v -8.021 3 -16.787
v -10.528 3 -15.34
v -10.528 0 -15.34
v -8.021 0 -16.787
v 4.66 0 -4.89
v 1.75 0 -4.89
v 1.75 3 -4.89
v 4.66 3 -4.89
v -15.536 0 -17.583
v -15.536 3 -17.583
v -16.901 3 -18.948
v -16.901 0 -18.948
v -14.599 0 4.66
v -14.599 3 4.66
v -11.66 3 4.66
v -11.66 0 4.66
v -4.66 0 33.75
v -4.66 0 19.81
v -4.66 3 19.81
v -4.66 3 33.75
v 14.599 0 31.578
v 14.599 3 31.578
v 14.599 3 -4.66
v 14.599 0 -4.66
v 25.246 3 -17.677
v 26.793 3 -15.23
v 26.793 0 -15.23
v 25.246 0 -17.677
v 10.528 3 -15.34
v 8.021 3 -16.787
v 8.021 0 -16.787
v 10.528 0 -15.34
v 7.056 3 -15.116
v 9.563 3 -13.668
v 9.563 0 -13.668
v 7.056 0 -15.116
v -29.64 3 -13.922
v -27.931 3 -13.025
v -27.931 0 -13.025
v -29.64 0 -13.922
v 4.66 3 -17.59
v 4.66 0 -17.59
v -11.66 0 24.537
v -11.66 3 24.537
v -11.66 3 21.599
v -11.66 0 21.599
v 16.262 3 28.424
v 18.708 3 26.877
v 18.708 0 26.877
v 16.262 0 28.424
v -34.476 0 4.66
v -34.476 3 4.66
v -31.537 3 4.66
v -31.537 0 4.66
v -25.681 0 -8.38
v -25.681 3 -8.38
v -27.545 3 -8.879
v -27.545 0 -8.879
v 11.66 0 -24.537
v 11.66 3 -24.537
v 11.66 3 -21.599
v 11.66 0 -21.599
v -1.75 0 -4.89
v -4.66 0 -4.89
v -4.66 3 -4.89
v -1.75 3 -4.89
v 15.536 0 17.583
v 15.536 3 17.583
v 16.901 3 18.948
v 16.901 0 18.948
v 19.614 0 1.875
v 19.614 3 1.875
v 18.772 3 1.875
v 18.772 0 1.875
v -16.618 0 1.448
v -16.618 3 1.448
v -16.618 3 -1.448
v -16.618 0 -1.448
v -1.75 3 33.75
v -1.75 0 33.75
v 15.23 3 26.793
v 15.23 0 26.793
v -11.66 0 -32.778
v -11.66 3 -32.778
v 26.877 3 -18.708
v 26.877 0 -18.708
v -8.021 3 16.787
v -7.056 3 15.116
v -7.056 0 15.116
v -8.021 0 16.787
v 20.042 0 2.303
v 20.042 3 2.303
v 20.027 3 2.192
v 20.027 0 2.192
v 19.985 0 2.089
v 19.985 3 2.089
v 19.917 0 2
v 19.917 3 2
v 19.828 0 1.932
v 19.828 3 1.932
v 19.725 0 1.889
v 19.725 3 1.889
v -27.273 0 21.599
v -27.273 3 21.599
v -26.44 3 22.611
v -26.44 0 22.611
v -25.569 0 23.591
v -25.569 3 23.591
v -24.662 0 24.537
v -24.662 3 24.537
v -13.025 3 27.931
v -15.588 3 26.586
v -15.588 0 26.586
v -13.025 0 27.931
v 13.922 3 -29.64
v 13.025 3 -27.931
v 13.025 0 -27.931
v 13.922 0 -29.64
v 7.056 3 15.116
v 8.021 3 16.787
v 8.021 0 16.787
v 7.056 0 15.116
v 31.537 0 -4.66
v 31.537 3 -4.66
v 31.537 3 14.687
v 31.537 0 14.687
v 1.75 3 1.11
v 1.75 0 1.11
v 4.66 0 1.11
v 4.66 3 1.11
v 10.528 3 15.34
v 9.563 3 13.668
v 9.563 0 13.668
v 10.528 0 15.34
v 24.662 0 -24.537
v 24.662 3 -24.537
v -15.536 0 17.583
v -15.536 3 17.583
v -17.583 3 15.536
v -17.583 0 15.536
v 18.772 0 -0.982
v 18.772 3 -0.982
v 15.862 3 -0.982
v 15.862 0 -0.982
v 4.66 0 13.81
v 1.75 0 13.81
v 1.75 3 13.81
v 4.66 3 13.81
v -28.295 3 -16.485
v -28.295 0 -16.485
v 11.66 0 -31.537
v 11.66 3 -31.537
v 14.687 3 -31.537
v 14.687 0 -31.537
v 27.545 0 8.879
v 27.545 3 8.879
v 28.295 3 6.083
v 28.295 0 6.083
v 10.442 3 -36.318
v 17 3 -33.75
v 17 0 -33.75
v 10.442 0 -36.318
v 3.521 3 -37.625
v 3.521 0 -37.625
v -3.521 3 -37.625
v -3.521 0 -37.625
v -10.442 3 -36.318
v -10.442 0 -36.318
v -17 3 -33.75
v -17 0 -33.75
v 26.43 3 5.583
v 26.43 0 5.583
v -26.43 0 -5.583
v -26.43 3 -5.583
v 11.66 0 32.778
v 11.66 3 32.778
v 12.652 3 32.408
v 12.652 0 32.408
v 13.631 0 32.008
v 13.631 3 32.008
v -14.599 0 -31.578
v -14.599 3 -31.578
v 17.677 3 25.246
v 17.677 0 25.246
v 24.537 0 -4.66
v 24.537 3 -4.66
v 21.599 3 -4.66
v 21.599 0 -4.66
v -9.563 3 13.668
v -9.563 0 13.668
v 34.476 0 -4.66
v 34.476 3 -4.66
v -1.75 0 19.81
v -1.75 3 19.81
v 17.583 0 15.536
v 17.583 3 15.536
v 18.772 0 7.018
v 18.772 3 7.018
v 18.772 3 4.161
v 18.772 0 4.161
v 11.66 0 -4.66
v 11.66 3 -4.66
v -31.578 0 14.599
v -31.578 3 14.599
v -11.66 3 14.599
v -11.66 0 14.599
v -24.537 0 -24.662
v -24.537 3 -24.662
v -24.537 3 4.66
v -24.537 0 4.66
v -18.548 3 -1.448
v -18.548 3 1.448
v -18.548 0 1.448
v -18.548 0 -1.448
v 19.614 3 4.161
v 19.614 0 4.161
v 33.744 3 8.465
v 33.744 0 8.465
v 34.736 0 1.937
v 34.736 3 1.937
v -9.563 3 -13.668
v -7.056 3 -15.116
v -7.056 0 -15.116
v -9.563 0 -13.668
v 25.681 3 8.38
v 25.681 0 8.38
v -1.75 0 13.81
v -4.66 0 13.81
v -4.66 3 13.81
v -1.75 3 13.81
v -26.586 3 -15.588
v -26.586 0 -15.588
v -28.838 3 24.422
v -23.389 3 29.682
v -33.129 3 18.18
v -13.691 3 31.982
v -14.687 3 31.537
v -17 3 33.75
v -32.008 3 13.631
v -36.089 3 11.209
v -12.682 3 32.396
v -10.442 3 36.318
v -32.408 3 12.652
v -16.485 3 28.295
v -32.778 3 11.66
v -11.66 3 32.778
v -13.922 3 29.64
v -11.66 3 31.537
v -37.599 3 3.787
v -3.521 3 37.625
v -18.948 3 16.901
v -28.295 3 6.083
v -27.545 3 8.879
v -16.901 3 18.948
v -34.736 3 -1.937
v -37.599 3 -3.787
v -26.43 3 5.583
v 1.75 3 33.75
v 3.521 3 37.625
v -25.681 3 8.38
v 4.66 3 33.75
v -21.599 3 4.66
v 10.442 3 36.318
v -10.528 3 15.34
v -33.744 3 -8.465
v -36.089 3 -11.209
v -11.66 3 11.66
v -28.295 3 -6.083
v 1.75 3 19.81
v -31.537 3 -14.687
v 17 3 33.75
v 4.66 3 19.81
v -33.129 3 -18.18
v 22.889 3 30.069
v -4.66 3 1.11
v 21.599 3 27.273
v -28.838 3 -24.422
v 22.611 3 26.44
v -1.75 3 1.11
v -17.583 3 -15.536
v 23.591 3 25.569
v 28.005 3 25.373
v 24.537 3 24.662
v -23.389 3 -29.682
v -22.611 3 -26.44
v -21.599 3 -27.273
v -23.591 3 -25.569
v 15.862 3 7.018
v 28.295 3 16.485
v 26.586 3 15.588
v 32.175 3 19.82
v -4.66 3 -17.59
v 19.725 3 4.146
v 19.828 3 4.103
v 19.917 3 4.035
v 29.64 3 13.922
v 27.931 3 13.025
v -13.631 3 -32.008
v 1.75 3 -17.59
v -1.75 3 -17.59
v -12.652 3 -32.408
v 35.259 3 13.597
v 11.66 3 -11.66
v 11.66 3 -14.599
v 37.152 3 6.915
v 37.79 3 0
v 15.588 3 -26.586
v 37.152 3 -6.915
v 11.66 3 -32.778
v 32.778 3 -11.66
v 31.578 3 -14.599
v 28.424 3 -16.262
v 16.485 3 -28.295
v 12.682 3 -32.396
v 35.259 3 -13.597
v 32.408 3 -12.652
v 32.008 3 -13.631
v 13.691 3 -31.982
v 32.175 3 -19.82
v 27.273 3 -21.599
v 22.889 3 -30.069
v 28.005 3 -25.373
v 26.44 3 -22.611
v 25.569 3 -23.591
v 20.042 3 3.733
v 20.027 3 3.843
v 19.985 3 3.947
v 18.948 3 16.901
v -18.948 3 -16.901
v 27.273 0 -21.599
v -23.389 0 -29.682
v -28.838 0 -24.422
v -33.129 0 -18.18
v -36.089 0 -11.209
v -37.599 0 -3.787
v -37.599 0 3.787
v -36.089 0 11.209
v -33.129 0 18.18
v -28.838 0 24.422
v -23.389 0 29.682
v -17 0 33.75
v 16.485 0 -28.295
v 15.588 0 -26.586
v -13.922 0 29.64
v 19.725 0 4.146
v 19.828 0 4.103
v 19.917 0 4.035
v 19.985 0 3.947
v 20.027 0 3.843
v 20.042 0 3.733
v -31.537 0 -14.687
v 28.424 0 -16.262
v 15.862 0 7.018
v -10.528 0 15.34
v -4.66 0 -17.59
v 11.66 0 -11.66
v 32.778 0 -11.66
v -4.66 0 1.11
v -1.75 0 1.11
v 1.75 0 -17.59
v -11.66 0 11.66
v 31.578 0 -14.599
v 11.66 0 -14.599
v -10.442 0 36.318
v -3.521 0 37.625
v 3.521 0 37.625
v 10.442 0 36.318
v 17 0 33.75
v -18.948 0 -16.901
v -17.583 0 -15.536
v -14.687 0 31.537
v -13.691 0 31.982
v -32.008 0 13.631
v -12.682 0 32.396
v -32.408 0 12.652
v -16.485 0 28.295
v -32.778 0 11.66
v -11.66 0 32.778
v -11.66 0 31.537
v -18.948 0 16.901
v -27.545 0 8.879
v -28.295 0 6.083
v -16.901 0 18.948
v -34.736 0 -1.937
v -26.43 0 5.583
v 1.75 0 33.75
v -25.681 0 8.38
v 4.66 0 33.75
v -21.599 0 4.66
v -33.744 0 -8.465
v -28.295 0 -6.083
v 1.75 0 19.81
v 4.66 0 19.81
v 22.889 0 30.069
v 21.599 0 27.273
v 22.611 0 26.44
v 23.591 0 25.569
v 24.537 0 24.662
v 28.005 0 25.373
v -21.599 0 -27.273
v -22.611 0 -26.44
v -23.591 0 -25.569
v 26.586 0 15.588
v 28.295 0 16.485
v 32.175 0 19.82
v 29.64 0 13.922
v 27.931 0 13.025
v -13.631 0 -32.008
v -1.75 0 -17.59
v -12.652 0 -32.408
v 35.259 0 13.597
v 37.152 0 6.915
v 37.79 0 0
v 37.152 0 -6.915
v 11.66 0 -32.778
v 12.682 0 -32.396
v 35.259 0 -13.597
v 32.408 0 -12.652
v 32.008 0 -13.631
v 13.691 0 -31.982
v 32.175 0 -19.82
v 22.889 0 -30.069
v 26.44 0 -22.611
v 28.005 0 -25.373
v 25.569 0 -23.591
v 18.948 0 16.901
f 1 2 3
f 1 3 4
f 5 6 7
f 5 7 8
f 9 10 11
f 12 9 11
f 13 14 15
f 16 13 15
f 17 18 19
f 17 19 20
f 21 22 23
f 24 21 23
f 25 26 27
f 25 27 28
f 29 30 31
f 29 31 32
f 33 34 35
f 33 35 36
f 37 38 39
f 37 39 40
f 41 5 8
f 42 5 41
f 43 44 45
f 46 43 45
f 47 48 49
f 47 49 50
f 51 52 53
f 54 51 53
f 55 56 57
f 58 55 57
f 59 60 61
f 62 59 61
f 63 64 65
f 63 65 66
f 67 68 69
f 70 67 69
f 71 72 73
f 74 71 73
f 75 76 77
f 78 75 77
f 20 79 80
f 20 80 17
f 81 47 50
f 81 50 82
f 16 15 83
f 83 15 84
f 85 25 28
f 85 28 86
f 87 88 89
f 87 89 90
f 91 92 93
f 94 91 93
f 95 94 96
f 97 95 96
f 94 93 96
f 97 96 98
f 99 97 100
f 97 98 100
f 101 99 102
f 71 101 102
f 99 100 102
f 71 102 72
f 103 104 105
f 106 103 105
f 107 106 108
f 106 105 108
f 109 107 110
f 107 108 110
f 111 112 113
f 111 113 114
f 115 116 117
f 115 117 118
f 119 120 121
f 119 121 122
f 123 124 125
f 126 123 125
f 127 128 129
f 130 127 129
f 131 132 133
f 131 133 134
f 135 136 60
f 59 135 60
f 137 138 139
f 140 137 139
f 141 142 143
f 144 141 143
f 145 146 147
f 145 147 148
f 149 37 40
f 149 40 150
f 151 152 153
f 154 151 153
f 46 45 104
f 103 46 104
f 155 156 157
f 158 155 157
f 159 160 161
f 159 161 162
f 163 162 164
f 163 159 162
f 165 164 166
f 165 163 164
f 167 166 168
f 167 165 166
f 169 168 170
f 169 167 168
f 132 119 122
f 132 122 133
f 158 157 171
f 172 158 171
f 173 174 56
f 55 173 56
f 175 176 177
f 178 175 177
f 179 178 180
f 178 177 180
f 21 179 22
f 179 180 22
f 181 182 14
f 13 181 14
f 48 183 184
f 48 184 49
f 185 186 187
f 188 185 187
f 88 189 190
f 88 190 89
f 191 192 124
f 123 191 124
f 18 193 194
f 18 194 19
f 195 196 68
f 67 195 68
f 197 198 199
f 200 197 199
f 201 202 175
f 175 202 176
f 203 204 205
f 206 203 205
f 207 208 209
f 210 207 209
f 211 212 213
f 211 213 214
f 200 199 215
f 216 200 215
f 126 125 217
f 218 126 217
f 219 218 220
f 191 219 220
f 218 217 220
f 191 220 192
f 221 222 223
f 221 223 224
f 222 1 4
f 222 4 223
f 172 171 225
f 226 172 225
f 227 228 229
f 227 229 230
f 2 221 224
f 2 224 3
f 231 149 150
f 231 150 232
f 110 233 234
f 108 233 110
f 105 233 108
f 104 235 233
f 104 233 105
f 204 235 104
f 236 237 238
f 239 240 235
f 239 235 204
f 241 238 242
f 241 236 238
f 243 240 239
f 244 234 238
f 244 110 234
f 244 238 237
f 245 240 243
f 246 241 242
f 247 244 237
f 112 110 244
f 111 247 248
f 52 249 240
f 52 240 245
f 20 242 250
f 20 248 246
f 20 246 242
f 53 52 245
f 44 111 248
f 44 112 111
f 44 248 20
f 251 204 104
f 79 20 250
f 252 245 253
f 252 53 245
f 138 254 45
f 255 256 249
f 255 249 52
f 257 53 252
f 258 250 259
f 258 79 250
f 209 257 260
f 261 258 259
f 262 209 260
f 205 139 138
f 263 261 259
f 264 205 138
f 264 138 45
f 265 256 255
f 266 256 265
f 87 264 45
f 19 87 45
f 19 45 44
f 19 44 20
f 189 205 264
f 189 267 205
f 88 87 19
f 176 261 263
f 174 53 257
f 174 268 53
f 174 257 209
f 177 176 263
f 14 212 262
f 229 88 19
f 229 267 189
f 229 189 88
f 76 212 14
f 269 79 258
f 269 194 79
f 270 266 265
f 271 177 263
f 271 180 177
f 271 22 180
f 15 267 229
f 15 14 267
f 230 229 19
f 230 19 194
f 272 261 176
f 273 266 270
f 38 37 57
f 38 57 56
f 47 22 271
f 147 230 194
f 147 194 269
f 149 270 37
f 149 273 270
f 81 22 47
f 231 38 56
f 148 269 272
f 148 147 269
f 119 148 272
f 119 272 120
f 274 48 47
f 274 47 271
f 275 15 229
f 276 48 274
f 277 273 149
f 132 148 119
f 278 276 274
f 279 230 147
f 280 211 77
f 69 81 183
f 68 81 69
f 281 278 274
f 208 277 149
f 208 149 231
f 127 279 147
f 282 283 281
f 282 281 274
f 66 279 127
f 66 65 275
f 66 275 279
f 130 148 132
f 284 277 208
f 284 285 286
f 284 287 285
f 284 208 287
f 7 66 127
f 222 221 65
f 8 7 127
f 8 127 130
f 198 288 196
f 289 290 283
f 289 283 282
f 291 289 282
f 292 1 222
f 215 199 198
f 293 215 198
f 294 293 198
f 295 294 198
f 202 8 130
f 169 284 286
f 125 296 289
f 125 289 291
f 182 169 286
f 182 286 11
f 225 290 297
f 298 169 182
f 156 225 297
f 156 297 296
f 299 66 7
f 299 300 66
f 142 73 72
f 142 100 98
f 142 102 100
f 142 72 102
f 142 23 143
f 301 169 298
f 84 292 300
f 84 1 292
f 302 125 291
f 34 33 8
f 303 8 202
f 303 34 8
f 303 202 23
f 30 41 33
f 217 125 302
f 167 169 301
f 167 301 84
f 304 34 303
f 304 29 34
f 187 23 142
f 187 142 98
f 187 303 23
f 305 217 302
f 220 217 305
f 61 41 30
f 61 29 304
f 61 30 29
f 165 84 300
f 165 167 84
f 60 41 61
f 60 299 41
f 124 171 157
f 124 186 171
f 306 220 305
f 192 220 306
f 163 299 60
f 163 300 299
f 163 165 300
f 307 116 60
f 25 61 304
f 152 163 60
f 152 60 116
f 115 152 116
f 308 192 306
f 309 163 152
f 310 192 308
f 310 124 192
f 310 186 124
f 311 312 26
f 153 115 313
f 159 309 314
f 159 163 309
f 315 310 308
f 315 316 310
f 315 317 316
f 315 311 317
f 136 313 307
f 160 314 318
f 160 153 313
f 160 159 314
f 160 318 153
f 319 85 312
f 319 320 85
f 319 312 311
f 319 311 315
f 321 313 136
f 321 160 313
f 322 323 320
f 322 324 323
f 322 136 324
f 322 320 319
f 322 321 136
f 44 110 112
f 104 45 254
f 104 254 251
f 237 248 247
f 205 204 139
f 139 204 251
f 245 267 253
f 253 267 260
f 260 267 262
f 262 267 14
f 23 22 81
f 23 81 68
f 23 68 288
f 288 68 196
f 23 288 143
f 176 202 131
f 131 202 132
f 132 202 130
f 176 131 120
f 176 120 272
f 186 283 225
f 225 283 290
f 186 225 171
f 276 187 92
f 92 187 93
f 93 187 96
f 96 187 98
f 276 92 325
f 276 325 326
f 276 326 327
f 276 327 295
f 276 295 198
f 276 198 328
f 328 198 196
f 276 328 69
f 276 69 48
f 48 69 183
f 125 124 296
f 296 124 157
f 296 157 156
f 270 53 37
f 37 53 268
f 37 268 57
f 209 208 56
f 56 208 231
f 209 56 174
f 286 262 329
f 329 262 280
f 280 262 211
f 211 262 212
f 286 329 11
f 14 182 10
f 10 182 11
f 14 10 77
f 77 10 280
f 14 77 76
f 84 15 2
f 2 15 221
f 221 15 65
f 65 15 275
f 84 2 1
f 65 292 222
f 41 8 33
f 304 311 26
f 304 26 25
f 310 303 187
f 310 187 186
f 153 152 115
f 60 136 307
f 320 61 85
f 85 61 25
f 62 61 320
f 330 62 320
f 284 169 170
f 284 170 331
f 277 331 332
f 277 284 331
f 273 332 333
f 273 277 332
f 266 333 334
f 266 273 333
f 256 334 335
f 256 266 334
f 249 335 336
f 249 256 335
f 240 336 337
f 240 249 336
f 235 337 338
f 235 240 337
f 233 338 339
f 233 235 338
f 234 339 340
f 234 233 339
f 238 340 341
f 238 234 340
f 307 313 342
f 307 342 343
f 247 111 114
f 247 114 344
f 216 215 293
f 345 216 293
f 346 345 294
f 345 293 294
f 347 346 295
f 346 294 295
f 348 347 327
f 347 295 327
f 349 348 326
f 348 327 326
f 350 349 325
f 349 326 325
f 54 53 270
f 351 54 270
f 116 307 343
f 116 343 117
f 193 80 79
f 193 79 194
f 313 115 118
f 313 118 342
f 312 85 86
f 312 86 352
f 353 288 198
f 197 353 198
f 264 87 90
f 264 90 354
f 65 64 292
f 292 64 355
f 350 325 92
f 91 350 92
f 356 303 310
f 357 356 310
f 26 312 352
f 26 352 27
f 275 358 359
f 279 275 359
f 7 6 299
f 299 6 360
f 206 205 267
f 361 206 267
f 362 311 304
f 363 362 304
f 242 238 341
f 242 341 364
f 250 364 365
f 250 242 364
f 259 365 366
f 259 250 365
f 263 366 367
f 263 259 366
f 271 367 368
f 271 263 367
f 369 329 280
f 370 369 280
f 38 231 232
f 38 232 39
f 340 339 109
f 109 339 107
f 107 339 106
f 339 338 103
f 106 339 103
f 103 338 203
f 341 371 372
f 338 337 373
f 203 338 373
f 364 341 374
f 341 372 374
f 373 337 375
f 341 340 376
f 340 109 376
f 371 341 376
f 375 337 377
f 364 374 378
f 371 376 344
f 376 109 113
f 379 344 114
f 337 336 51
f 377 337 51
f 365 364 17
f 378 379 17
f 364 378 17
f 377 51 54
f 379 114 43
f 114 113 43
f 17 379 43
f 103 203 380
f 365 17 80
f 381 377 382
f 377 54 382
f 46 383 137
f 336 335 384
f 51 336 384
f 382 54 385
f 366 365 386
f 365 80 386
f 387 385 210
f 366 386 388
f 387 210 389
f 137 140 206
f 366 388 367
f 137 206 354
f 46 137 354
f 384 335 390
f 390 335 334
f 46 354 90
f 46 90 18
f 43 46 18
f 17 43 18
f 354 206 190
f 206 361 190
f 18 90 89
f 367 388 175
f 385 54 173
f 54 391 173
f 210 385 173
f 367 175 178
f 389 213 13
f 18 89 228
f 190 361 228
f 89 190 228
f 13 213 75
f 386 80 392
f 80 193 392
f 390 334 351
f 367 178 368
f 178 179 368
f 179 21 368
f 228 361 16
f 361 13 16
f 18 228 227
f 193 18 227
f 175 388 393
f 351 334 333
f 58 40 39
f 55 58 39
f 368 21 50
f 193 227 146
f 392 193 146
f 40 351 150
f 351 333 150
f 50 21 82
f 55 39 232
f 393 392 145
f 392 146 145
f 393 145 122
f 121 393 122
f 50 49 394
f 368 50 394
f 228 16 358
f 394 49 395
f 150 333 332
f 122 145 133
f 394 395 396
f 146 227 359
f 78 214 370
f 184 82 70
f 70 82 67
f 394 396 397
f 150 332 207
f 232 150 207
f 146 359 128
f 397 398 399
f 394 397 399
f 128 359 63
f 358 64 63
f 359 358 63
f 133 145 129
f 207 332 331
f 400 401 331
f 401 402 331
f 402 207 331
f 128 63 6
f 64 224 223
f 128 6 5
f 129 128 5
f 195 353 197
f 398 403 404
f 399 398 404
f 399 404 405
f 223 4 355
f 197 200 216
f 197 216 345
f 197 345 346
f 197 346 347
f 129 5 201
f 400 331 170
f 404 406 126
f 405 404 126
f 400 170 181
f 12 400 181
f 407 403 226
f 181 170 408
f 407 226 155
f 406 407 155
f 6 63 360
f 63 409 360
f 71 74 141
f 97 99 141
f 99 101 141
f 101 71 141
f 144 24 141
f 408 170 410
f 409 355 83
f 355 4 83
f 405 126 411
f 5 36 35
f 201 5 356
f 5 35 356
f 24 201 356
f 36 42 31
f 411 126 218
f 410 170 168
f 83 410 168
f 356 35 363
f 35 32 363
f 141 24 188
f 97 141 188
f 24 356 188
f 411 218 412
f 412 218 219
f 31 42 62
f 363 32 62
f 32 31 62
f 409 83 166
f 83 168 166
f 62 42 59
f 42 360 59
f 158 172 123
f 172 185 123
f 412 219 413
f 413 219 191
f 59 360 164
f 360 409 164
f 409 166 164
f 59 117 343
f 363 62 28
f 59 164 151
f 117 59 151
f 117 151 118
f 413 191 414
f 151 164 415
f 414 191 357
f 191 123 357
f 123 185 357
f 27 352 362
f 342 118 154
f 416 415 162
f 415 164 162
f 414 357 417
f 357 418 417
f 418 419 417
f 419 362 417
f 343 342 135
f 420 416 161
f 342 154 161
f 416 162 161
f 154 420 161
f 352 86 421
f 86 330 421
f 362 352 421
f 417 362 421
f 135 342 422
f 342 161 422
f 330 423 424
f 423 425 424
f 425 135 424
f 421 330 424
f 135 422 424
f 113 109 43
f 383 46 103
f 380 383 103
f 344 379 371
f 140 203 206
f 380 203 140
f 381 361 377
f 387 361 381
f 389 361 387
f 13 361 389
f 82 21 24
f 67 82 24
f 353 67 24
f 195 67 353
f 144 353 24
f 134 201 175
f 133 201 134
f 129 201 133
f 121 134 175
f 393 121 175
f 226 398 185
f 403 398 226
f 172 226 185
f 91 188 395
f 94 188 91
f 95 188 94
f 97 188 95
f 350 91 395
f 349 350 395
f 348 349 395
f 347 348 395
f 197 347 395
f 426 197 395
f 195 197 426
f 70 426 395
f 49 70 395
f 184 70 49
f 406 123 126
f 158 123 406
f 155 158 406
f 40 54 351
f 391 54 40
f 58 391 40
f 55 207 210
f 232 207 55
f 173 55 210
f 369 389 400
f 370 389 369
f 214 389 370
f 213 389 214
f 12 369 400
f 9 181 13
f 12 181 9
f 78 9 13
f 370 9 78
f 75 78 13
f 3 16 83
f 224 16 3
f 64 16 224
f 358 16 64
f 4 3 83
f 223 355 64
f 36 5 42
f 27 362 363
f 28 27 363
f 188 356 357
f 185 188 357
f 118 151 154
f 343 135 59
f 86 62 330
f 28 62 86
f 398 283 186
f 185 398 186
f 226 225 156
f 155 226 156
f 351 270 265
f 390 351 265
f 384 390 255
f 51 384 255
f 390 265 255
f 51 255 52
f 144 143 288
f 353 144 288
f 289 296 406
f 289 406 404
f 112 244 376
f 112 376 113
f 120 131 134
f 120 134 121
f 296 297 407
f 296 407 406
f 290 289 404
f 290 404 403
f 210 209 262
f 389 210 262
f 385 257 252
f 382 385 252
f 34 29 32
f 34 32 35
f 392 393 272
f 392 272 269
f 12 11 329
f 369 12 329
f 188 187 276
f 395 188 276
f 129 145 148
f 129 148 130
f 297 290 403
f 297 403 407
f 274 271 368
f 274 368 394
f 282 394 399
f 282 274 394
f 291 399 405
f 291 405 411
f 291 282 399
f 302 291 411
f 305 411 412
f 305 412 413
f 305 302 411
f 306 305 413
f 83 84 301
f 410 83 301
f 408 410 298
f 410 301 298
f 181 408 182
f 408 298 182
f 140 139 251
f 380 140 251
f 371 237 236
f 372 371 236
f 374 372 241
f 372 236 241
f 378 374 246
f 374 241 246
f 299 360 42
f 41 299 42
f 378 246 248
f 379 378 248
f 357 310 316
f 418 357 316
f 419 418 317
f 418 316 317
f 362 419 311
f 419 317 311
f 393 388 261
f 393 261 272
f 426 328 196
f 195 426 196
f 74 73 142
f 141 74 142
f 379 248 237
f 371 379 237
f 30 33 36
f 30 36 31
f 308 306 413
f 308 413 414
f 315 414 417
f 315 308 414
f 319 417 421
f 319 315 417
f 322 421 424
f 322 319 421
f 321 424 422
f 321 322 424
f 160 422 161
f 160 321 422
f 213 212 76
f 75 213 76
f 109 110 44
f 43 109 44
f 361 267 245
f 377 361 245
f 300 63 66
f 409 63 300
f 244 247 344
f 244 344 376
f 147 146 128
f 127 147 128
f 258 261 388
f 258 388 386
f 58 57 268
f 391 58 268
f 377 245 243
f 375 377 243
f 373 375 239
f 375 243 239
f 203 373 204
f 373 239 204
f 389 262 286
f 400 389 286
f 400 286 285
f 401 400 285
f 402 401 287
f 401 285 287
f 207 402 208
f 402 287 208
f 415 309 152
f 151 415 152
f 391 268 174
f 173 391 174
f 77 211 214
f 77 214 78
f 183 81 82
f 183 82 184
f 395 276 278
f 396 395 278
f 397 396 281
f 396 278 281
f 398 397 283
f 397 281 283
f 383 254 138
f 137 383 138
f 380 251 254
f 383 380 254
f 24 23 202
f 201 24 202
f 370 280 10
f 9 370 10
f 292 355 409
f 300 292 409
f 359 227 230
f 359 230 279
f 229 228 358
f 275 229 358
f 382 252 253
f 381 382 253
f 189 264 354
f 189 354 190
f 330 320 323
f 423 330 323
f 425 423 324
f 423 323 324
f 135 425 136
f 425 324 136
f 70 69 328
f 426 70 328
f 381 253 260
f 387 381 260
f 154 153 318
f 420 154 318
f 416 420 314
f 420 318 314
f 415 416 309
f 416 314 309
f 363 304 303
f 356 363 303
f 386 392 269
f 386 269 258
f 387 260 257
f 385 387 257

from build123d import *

# Parameters (mm, degrees)
SKETCH_1_W          = 2.91
SKETCH_1_H          = 12.7
EXTRUDE_1_DEPTH     = 3
EXTRUDE_2_DEPTH     = 3
CUT_EXTRUDE_3_DEPTH = 3
SKETCH_3_W          = 1.93
SKETCH_3_H          = 2.895
CUT_EXTRUDE_1_DEPTH = 3


with BuildPart() as part:
    # 스케치1 → 보스-돌출1 (new body)
    with BuildSketch(Plane(origin=(0, 0, 0), x_dir=(1, 0, 0), z_dir=(0, 1, 0))):
        Polygon((-17, -33.75), (-17, 33.75), (-4.66, 33.75), (-1.75, 33.75), (1.75, 33.75), (4.66, 33.75), (17, 33.75), (17, -33.75), (4.66, -33.75), (4.66, -19.81), (1.75, -19.81), (1.75, -33.75), (-1.75, -33.75), (-1.75, -19.81), (-4.66, -19.81), (-4.66, -33.75), align=None)
        with Locations((-3.205, 11.24)):
            Rectangle(SKETCH_1_W, SKETCH_1_H, mode=Mode.SUBTRACT)
        with Locations((-3.205, -7.46)):
            Rectangle(SKETCH_1_W, SKETCH_1_H, mode=Mode.SUBTRACT)
        with Locations((3.205, 11.24)):
            Rectangle(SKETCH_1_W, SKETCH_1_H, mode=Mode.SUBTRACT)
        with Locations((3.205, -7.46)):
            Rectangle(SKETCH_1_W, SKETCH_1_H, mode=Mode.SUBTRACT)
    extrude(amount=EXTRUDE_1_DEPTH)

    # 스케치2 → 보스-돌출2 (add)
    with BuildSketch(Plane(origin=(0, 3, 0), x_dir=(1, 0, 0), z_dir=(0, 1, 0))):
        with BuildLine():
            Line((-17, -33.75), (-17, 33.75))
            ThreePointArc((-17, 33.75), (-37.789714209, 0), (-17, -33.75))
        make_face()
        with BuildLine():
            ThreePointArc((-17, -33.75), (0, -37.789714209), (17, -33.75))
            Line((17, -33.75), (4.66, -33.75))
            Line((4.66, -33.75), (1.75, -33.75))
            Line((1.75, -33.75), (-1.75, -33.75))
            Line((-1.75, -33.75), (-4.66, -33.75))
            Line((-4.66, -33.75), (-17, -33.75))
        make_face()
        with BuildLine():
            ThreePointArc((37.789714209, 0), (32.175205062, 19.819653862), (17, 33.75))
            Line((17, 33.75), (17, -33.75))
            ThreePointArc((17, -33.75), (32.175205062, -19.819653862), (37.789714209, 0))
        make_face()
        with BuildLine():
            Line((-17, 33.75), (17, 33.75))
            ThreePointArc((17, 33.75), (0, 37.789714209), (-17, 33.75))
        make_face()
    extrude(amount=-EXTRUDE_2_DEPTH)

    # 스케치5 → 컷-돌출3 (cut)
    with BuildSketch(Plane(origin=(0, 3, 0), x_dir=(1, 0, 0), z_dir=(0, 1, 0))):
        with BuildLine():
            Line((-34.476203601, -4.66), (-31.537469067, -4.66))
            Line((-31.537469067, -4.66), (-31.537469067, 14.687146066))
            ThreePointArc((-31.537469067, 14.687146066), (-34.395192397, 5.224457362), (-34.476203601, -4.66))
        make_face()
        with BuildLine():
            Line((-24.537469067, 24.662457836), (-24.537469067, -4.66))
            Line((-24.537469067, -4.66), (-21.598734534, -4.66))
            Line((-21.598734534, -4.66), (-21.598734534, 27.273043125))
            ThreePointArc((-21.598734534, 27.273043125), (-23.10500183, 26.009288825), (-24.537469067, 24.662457836))
        make_face()
        with BuildLine():
            Line((-14.598734534, 31.578492123), (-14.598734534, -4.66))
            Line((-14.598734534, -4.66), (-11.66, -4.66))
            Line((-11.66, -4.66), (-11.66, 32.777562672))
            ThreePointArc((-11.66, 32.777562672), (-13.143048633, 32.211558288), (-14.598734534, 31.578492123))
        make_face()
        with BuildLine():
            Line((31.578492123, 14.598734534), (11.66, 14.598734534))
            Line((11.66, 14.598734534), (11.66, 11.66))
            Line((11.66, 11.66), (32.777562672, 11.66))
            ThreePointArc((32.777562672, 11.66), (32.211558288, 13.143048633), (31.578492123, 14.598734534))
        make_face()
        with BuildLine():
            Line((24.662457836, 24.537469067), (11.66, 24.537469067))
            Line((11.66, 24.537469067), (11.66, 21.598734534))
            Line((11.66, 21.598734534), (27.273043125, 21.598734534))
            ThreePointArc((27.273043125, 21.598734534), (26.009288825, 23.10500183), (24.662457836, 24.537469067))
        make_face()
        with BuildLine():
            Line((11.66, 31.537469067), (14.687146066, 31.537469067))
            ThreePointArc((14.687146066, 31.537469067), (13.188156979, 32.193116194), (11.66, 32.777562672))
            Line((11.66, 32.777562672), (11.66, 31.537469067))
        make_face()
        with BuildLine():
            Line((14.598734534, -31.578492123), (14.598734534, 4.66))
            Line((14.598734534, 4.66), (11.66, 4.66))
            Line((11.66, 4.66), (11.66, -32.777562672))
            ThreePointArc((11.66, -32.777562672), (13.143048633, -32.211558288), (14.598734534, -31.578492123))
        make_face()
        with BuildLine():
            Line((24.537469067, -24.662457836), (24.537469067, 4.66))
            Line((24.537469067, 4.66), (21.598734534, 4.66))
            Line((21.598734534, 4.66), (21.598734534, -27.273043125))
            ThreePointArc((21.598734534, -27.273043125), (23.10500183, -26.009288825), (24.537469067, -24.662457836))
        make_face()
        with BuildLine():
            Line((31.537469067, 4.66), (31.537469067, -14.687146066))
            ThreePointArc((31.537469067, -14.687146066), (34.395192397, -5.224457362), (34.476203601, 4.66))
            Line((34.476203601, 4.66), (31.537469067, 4.66))
        make_face()
        with BuildLine():
            Line((-31.578492123, -14.598734534), (-11.66, -14.598734534))
            Line((-11.66, -14.598734534), (-11.66, -11.66))
            Line((-11.66, -11.66), (-32.777562672, -11.66))
            ThreePointArc((-32.777562672, -11.66), (-32.211558288, -13.143048633), (-31.578492123, -14.598734534))
        make_face()
        with BuildLine():
            Line((-24.662457836, -24.537469067), (-11.66, -24.537469067))
            Line((-11.66, -24.537469067), (-11.66, -21.598734534))
            Line((-11.66, -21.598734534), (-27.273043125, -21.598734534))
            ThreePointArc((-27.273043125, -21.598734534), (-26.009288825, -23.10500183), (-24.662457836, -24.537469067))
        make_face()
        with BuildLine():
            Line((-11.66, -31.537469067), (-14.687146066, -31.537469067))
            ThreePointArc((-14.687146066, -31.537469067), (-13.188156979, -32.193116194), (-11.66, -32.777562672))
            Line((-11.66, -32.777562672), (-11.66, -31.537469067))
        make_face()
    extrude(amount=-CUT_EXTRUDE_3_DEPTH, mode=Mode.SUBTRACT)

    # 스케치3 → 컷-돌출1 (cut)
    with BuildSketch(Plane(origin=(0, 3, 0), x_dir=(1, 0, 0), z_dir=(0, 1, 0))):
        Polygon((-13.921720976, -29.640380671), (-16.485116171, -28.295007088), (-15.588200449, -26.586076958), (-13.024805254, -27.931450541), align=None)
        Polygon((-29.640380671, 13.921720976), (-28.295007088, 16.485116171), (-26.586076958, 15.588200449), (-27.931450541, 13.024805254), align=None)
        Polygon((13.921720976, 29.640380671), (16.485116171, 28.295007088), (15.588200449, 26.586076958), (13.024805254, 27.931450541), align=None)
        Polygon((26.876754365, 18.708462151), (28.424032932, 16.261636853), (26.792816067, 15.230117809), (25.2455375, 17.676943106), align=None)
        Polygon((29.640380671, -13.921720976), (28.295007088, -16.485116171), (26.586076958, -15.588200449), (27.931450541, -13.024805254), align=None)
        Polygon((-28.294726577, -6.082986865), (-27.545445441, -8.879342132), (-25.681208596, -8.379821375), (-26.430489732, -5.583466108), align=None)
        Polygon((-27.545445441, 8.879342132), (-28.294726577, 6.082986865), (-26.430489732, 5.583466108), (-25.681208596, 8.379821375), align=None)
        Polygon((27.545445441, -8.879342132), (28.294726577, -6.082986865), (26.430489732, -5.583466108), (25.681208596, -8.379821375), align=None)
        Polygon((-18.947986862, -16.900912731), (-16.900912731, -18.947986862), (-15.536196643, -17.583270774), (-17.583270774, -15.536196643), align=None)
        Polygon((-16.900912731, 18.947986862), (-18.947986862, 16.900912731), (-17.583270774, 15.536196643), (-15.536196643, 17.583270774), align=None)
        with BuildLine():
            Line((15.862041837, -7.0175654), (18.772041837, -7.0175654))
            Line((18.772041837, -7.0175654), (18.772041837, -4.1605654))
            Line((18.772041837, -4.1605654), (19.614041677, -4.1605654))
            ThreePointArc((19.614041677, -4.1605654), (19.916683492, -4.035207055), (20.042041837, -3.73256524))
            Line((20.042041837, -3.73256524), (20.042041837, -2.30256556))
            ThreePointArc((20.042041837, -2.30256556), (19.916683492, -1.999923745), (19.614041677, -1.8745654))
            Line((19.614041677, -1.8745654), (18.772041837, -1.8745654))
            Line((18.772041837, -1.8745654), (18.772041837, 0.9824346))
            Line((18.772041837, 0.9824346), (15.862041837, 0.9824346))
            Line((15.862041837, 0.9824346), (15.862041837, -7.0175654))
        make_face()
        Polygon((18.708462151, -26.876754365), (16.261636853, -28.424032932), (15.230117809, -26.792816067), (17.676943106, -25.2455375), align=None)
        Polygon((16.900912731, -18.947986862), (18.947986862, -16.900912731), (17.583270774, -15.536196643), (15.536196643, -17.583270774), align=None)
        Polygon((-10.527707159, 15.339523687), (-8.020563615, 16.787023687), (-7.055563615, 15.115594658), (-9.562707159, 13.668094658), align=None)
        with Locations((-17.583270774, 0)):
            Rectangle(SKETCH_3_W, SKETCH_3_H)
        Polygon((8.020563615, 16.787023687), (10.527707159, 15.339523687), (9.562707159, 13.668094658), (7.055563615, 15.115594658), align=None)
        Polygon((10.527707159, -15.339523687), (8.020563615, -16.787023687), (7.055563615, -15.115594658), (9.562707159, -13.668094658), align=None)
        Polygon((-8.020563615, -16.787023687), (-10.527707159, -15.339523687), (-9.562707159, -13.668094658), (-7.055563615, -15.115594658), align=None)
    extrude(amount=-CUT_EXTRUDE_1_DEPTH, mode=Mode.SUBTRACT)


solid = part.part
